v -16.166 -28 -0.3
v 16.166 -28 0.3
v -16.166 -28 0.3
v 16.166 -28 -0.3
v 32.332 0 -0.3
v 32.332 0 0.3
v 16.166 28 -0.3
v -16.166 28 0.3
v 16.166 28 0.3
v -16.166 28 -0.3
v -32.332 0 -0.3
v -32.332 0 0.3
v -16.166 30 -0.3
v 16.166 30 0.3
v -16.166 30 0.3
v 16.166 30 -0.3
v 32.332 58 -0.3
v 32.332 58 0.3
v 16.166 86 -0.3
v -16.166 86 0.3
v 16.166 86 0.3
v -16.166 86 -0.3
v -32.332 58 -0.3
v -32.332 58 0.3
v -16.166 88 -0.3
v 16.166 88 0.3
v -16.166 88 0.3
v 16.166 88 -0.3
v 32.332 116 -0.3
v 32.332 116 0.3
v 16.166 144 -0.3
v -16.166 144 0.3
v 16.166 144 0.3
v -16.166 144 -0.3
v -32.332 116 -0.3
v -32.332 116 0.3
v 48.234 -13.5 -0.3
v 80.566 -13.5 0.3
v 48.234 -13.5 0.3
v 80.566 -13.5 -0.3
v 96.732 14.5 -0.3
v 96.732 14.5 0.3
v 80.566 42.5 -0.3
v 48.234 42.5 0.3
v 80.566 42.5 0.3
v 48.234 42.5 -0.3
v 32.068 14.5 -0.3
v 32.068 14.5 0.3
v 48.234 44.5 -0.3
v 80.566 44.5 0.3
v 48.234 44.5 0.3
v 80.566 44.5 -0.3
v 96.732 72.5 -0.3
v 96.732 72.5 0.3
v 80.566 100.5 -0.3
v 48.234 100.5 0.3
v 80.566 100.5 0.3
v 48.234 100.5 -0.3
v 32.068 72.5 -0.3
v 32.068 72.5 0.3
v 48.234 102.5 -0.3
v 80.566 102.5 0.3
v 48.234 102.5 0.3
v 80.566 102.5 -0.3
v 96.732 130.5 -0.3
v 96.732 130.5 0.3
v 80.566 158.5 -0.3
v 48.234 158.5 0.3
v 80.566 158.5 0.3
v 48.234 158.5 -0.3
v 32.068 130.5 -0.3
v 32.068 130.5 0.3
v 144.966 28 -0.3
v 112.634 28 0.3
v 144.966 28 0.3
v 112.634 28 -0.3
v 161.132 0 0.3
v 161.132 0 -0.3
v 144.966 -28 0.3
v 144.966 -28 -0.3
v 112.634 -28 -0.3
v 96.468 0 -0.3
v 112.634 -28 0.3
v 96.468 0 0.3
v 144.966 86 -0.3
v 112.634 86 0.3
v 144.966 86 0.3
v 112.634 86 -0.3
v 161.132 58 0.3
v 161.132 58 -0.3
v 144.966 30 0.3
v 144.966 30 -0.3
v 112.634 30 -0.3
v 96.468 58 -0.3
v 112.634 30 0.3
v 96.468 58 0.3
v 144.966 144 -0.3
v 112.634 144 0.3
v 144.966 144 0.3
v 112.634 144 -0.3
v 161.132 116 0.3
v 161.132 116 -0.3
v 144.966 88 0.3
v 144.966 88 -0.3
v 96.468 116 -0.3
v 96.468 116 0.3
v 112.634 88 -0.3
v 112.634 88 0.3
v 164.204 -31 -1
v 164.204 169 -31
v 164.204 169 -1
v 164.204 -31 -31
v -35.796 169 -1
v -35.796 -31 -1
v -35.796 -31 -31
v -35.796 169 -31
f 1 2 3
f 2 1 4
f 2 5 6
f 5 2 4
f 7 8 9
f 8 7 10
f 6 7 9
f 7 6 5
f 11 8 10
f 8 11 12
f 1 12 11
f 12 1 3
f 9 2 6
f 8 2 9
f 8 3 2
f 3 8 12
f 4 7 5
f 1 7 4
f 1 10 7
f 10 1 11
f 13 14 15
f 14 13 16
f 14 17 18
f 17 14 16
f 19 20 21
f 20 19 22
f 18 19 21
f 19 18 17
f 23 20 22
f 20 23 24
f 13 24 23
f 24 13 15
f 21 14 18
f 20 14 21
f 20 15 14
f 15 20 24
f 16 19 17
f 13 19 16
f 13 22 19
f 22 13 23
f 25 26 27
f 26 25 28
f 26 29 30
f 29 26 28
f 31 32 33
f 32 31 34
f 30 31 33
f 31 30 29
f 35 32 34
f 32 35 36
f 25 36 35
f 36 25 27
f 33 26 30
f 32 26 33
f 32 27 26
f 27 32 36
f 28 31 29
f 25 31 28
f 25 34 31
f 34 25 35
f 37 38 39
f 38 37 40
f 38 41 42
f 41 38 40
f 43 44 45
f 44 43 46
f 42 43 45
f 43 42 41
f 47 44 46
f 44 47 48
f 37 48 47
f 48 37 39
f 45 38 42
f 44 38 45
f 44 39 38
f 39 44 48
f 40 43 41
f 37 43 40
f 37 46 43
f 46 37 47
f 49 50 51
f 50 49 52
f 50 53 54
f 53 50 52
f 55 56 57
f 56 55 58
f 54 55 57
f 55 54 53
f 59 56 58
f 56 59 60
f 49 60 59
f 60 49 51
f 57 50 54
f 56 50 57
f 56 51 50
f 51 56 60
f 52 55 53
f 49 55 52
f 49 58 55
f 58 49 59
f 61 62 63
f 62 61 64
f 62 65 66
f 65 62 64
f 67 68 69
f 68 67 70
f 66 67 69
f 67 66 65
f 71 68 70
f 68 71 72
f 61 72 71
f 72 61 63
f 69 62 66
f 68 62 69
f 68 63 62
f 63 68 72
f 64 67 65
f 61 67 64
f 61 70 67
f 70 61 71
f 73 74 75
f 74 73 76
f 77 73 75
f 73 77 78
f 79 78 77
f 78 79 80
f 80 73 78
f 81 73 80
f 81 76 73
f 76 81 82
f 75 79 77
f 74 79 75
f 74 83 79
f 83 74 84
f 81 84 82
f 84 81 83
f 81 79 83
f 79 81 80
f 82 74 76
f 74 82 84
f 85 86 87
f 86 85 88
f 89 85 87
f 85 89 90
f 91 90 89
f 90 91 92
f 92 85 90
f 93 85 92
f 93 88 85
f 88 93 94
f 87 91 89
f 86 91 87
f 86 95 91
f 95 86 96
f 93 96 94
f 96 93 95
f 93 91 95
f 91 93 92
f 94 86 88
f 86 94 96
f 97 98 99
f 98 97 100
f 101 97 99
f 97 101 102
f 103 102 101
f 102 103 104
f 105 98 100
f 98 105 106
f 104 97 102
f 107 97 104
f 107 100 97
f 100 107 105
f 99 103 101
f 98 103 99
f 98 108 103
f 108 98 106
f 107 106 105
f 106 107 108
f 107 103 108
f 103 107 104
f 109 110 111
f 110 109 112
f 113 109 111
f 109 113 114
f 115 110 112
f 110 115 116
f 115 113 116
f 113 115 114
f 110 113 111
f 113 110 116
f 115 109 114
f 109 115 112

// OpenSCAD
small_radius1 = 56/2;
internal_border=2;
externalBorder = 3;

plate_size_x = 200;
plate_size_y = 200;

small_radius2 = small_radius1 + internal_border/2;
small_radius3= small_radius1 + externalBorder;

big_radius1= (2 * small_radius1)/sqrt(3);
big_radius2= (2 * small_radius2)/sqrt(3);
big_radius3= (2 * small_radius3)/sqrt(3);

echo("big_radius is : ",big_radius2);
borderHeight = 0.1;
height = 0.6;

color([0.1,0.1,0.1])
translate([-big_radius3, -small_radius3, -31]){
    cube([plate_size_x, plate_size_y, 30]);
}


for ( x_i = [0:2] ){
    for ( y_i = [0:2] ){
        offset_y = x_i %2 == 0 ? 0 : small_radius2 / 2;
        x = (small_radius1) * 2.3 * x_i;
        y = (small_radius2) * 2 * y_i + offset_y;
        echo("x ", x, " and y ", y)
        translate([x,y,0]){
            //color([1,0,0]) //red
            //cylinder(r=radius + distance, h=height-0.1, $fn=6,center = true);
                
            color([0,1,0]) //green
            cylinder(r=big_radius1, h=height, $fn=6,center = true);
        }
    }
}
